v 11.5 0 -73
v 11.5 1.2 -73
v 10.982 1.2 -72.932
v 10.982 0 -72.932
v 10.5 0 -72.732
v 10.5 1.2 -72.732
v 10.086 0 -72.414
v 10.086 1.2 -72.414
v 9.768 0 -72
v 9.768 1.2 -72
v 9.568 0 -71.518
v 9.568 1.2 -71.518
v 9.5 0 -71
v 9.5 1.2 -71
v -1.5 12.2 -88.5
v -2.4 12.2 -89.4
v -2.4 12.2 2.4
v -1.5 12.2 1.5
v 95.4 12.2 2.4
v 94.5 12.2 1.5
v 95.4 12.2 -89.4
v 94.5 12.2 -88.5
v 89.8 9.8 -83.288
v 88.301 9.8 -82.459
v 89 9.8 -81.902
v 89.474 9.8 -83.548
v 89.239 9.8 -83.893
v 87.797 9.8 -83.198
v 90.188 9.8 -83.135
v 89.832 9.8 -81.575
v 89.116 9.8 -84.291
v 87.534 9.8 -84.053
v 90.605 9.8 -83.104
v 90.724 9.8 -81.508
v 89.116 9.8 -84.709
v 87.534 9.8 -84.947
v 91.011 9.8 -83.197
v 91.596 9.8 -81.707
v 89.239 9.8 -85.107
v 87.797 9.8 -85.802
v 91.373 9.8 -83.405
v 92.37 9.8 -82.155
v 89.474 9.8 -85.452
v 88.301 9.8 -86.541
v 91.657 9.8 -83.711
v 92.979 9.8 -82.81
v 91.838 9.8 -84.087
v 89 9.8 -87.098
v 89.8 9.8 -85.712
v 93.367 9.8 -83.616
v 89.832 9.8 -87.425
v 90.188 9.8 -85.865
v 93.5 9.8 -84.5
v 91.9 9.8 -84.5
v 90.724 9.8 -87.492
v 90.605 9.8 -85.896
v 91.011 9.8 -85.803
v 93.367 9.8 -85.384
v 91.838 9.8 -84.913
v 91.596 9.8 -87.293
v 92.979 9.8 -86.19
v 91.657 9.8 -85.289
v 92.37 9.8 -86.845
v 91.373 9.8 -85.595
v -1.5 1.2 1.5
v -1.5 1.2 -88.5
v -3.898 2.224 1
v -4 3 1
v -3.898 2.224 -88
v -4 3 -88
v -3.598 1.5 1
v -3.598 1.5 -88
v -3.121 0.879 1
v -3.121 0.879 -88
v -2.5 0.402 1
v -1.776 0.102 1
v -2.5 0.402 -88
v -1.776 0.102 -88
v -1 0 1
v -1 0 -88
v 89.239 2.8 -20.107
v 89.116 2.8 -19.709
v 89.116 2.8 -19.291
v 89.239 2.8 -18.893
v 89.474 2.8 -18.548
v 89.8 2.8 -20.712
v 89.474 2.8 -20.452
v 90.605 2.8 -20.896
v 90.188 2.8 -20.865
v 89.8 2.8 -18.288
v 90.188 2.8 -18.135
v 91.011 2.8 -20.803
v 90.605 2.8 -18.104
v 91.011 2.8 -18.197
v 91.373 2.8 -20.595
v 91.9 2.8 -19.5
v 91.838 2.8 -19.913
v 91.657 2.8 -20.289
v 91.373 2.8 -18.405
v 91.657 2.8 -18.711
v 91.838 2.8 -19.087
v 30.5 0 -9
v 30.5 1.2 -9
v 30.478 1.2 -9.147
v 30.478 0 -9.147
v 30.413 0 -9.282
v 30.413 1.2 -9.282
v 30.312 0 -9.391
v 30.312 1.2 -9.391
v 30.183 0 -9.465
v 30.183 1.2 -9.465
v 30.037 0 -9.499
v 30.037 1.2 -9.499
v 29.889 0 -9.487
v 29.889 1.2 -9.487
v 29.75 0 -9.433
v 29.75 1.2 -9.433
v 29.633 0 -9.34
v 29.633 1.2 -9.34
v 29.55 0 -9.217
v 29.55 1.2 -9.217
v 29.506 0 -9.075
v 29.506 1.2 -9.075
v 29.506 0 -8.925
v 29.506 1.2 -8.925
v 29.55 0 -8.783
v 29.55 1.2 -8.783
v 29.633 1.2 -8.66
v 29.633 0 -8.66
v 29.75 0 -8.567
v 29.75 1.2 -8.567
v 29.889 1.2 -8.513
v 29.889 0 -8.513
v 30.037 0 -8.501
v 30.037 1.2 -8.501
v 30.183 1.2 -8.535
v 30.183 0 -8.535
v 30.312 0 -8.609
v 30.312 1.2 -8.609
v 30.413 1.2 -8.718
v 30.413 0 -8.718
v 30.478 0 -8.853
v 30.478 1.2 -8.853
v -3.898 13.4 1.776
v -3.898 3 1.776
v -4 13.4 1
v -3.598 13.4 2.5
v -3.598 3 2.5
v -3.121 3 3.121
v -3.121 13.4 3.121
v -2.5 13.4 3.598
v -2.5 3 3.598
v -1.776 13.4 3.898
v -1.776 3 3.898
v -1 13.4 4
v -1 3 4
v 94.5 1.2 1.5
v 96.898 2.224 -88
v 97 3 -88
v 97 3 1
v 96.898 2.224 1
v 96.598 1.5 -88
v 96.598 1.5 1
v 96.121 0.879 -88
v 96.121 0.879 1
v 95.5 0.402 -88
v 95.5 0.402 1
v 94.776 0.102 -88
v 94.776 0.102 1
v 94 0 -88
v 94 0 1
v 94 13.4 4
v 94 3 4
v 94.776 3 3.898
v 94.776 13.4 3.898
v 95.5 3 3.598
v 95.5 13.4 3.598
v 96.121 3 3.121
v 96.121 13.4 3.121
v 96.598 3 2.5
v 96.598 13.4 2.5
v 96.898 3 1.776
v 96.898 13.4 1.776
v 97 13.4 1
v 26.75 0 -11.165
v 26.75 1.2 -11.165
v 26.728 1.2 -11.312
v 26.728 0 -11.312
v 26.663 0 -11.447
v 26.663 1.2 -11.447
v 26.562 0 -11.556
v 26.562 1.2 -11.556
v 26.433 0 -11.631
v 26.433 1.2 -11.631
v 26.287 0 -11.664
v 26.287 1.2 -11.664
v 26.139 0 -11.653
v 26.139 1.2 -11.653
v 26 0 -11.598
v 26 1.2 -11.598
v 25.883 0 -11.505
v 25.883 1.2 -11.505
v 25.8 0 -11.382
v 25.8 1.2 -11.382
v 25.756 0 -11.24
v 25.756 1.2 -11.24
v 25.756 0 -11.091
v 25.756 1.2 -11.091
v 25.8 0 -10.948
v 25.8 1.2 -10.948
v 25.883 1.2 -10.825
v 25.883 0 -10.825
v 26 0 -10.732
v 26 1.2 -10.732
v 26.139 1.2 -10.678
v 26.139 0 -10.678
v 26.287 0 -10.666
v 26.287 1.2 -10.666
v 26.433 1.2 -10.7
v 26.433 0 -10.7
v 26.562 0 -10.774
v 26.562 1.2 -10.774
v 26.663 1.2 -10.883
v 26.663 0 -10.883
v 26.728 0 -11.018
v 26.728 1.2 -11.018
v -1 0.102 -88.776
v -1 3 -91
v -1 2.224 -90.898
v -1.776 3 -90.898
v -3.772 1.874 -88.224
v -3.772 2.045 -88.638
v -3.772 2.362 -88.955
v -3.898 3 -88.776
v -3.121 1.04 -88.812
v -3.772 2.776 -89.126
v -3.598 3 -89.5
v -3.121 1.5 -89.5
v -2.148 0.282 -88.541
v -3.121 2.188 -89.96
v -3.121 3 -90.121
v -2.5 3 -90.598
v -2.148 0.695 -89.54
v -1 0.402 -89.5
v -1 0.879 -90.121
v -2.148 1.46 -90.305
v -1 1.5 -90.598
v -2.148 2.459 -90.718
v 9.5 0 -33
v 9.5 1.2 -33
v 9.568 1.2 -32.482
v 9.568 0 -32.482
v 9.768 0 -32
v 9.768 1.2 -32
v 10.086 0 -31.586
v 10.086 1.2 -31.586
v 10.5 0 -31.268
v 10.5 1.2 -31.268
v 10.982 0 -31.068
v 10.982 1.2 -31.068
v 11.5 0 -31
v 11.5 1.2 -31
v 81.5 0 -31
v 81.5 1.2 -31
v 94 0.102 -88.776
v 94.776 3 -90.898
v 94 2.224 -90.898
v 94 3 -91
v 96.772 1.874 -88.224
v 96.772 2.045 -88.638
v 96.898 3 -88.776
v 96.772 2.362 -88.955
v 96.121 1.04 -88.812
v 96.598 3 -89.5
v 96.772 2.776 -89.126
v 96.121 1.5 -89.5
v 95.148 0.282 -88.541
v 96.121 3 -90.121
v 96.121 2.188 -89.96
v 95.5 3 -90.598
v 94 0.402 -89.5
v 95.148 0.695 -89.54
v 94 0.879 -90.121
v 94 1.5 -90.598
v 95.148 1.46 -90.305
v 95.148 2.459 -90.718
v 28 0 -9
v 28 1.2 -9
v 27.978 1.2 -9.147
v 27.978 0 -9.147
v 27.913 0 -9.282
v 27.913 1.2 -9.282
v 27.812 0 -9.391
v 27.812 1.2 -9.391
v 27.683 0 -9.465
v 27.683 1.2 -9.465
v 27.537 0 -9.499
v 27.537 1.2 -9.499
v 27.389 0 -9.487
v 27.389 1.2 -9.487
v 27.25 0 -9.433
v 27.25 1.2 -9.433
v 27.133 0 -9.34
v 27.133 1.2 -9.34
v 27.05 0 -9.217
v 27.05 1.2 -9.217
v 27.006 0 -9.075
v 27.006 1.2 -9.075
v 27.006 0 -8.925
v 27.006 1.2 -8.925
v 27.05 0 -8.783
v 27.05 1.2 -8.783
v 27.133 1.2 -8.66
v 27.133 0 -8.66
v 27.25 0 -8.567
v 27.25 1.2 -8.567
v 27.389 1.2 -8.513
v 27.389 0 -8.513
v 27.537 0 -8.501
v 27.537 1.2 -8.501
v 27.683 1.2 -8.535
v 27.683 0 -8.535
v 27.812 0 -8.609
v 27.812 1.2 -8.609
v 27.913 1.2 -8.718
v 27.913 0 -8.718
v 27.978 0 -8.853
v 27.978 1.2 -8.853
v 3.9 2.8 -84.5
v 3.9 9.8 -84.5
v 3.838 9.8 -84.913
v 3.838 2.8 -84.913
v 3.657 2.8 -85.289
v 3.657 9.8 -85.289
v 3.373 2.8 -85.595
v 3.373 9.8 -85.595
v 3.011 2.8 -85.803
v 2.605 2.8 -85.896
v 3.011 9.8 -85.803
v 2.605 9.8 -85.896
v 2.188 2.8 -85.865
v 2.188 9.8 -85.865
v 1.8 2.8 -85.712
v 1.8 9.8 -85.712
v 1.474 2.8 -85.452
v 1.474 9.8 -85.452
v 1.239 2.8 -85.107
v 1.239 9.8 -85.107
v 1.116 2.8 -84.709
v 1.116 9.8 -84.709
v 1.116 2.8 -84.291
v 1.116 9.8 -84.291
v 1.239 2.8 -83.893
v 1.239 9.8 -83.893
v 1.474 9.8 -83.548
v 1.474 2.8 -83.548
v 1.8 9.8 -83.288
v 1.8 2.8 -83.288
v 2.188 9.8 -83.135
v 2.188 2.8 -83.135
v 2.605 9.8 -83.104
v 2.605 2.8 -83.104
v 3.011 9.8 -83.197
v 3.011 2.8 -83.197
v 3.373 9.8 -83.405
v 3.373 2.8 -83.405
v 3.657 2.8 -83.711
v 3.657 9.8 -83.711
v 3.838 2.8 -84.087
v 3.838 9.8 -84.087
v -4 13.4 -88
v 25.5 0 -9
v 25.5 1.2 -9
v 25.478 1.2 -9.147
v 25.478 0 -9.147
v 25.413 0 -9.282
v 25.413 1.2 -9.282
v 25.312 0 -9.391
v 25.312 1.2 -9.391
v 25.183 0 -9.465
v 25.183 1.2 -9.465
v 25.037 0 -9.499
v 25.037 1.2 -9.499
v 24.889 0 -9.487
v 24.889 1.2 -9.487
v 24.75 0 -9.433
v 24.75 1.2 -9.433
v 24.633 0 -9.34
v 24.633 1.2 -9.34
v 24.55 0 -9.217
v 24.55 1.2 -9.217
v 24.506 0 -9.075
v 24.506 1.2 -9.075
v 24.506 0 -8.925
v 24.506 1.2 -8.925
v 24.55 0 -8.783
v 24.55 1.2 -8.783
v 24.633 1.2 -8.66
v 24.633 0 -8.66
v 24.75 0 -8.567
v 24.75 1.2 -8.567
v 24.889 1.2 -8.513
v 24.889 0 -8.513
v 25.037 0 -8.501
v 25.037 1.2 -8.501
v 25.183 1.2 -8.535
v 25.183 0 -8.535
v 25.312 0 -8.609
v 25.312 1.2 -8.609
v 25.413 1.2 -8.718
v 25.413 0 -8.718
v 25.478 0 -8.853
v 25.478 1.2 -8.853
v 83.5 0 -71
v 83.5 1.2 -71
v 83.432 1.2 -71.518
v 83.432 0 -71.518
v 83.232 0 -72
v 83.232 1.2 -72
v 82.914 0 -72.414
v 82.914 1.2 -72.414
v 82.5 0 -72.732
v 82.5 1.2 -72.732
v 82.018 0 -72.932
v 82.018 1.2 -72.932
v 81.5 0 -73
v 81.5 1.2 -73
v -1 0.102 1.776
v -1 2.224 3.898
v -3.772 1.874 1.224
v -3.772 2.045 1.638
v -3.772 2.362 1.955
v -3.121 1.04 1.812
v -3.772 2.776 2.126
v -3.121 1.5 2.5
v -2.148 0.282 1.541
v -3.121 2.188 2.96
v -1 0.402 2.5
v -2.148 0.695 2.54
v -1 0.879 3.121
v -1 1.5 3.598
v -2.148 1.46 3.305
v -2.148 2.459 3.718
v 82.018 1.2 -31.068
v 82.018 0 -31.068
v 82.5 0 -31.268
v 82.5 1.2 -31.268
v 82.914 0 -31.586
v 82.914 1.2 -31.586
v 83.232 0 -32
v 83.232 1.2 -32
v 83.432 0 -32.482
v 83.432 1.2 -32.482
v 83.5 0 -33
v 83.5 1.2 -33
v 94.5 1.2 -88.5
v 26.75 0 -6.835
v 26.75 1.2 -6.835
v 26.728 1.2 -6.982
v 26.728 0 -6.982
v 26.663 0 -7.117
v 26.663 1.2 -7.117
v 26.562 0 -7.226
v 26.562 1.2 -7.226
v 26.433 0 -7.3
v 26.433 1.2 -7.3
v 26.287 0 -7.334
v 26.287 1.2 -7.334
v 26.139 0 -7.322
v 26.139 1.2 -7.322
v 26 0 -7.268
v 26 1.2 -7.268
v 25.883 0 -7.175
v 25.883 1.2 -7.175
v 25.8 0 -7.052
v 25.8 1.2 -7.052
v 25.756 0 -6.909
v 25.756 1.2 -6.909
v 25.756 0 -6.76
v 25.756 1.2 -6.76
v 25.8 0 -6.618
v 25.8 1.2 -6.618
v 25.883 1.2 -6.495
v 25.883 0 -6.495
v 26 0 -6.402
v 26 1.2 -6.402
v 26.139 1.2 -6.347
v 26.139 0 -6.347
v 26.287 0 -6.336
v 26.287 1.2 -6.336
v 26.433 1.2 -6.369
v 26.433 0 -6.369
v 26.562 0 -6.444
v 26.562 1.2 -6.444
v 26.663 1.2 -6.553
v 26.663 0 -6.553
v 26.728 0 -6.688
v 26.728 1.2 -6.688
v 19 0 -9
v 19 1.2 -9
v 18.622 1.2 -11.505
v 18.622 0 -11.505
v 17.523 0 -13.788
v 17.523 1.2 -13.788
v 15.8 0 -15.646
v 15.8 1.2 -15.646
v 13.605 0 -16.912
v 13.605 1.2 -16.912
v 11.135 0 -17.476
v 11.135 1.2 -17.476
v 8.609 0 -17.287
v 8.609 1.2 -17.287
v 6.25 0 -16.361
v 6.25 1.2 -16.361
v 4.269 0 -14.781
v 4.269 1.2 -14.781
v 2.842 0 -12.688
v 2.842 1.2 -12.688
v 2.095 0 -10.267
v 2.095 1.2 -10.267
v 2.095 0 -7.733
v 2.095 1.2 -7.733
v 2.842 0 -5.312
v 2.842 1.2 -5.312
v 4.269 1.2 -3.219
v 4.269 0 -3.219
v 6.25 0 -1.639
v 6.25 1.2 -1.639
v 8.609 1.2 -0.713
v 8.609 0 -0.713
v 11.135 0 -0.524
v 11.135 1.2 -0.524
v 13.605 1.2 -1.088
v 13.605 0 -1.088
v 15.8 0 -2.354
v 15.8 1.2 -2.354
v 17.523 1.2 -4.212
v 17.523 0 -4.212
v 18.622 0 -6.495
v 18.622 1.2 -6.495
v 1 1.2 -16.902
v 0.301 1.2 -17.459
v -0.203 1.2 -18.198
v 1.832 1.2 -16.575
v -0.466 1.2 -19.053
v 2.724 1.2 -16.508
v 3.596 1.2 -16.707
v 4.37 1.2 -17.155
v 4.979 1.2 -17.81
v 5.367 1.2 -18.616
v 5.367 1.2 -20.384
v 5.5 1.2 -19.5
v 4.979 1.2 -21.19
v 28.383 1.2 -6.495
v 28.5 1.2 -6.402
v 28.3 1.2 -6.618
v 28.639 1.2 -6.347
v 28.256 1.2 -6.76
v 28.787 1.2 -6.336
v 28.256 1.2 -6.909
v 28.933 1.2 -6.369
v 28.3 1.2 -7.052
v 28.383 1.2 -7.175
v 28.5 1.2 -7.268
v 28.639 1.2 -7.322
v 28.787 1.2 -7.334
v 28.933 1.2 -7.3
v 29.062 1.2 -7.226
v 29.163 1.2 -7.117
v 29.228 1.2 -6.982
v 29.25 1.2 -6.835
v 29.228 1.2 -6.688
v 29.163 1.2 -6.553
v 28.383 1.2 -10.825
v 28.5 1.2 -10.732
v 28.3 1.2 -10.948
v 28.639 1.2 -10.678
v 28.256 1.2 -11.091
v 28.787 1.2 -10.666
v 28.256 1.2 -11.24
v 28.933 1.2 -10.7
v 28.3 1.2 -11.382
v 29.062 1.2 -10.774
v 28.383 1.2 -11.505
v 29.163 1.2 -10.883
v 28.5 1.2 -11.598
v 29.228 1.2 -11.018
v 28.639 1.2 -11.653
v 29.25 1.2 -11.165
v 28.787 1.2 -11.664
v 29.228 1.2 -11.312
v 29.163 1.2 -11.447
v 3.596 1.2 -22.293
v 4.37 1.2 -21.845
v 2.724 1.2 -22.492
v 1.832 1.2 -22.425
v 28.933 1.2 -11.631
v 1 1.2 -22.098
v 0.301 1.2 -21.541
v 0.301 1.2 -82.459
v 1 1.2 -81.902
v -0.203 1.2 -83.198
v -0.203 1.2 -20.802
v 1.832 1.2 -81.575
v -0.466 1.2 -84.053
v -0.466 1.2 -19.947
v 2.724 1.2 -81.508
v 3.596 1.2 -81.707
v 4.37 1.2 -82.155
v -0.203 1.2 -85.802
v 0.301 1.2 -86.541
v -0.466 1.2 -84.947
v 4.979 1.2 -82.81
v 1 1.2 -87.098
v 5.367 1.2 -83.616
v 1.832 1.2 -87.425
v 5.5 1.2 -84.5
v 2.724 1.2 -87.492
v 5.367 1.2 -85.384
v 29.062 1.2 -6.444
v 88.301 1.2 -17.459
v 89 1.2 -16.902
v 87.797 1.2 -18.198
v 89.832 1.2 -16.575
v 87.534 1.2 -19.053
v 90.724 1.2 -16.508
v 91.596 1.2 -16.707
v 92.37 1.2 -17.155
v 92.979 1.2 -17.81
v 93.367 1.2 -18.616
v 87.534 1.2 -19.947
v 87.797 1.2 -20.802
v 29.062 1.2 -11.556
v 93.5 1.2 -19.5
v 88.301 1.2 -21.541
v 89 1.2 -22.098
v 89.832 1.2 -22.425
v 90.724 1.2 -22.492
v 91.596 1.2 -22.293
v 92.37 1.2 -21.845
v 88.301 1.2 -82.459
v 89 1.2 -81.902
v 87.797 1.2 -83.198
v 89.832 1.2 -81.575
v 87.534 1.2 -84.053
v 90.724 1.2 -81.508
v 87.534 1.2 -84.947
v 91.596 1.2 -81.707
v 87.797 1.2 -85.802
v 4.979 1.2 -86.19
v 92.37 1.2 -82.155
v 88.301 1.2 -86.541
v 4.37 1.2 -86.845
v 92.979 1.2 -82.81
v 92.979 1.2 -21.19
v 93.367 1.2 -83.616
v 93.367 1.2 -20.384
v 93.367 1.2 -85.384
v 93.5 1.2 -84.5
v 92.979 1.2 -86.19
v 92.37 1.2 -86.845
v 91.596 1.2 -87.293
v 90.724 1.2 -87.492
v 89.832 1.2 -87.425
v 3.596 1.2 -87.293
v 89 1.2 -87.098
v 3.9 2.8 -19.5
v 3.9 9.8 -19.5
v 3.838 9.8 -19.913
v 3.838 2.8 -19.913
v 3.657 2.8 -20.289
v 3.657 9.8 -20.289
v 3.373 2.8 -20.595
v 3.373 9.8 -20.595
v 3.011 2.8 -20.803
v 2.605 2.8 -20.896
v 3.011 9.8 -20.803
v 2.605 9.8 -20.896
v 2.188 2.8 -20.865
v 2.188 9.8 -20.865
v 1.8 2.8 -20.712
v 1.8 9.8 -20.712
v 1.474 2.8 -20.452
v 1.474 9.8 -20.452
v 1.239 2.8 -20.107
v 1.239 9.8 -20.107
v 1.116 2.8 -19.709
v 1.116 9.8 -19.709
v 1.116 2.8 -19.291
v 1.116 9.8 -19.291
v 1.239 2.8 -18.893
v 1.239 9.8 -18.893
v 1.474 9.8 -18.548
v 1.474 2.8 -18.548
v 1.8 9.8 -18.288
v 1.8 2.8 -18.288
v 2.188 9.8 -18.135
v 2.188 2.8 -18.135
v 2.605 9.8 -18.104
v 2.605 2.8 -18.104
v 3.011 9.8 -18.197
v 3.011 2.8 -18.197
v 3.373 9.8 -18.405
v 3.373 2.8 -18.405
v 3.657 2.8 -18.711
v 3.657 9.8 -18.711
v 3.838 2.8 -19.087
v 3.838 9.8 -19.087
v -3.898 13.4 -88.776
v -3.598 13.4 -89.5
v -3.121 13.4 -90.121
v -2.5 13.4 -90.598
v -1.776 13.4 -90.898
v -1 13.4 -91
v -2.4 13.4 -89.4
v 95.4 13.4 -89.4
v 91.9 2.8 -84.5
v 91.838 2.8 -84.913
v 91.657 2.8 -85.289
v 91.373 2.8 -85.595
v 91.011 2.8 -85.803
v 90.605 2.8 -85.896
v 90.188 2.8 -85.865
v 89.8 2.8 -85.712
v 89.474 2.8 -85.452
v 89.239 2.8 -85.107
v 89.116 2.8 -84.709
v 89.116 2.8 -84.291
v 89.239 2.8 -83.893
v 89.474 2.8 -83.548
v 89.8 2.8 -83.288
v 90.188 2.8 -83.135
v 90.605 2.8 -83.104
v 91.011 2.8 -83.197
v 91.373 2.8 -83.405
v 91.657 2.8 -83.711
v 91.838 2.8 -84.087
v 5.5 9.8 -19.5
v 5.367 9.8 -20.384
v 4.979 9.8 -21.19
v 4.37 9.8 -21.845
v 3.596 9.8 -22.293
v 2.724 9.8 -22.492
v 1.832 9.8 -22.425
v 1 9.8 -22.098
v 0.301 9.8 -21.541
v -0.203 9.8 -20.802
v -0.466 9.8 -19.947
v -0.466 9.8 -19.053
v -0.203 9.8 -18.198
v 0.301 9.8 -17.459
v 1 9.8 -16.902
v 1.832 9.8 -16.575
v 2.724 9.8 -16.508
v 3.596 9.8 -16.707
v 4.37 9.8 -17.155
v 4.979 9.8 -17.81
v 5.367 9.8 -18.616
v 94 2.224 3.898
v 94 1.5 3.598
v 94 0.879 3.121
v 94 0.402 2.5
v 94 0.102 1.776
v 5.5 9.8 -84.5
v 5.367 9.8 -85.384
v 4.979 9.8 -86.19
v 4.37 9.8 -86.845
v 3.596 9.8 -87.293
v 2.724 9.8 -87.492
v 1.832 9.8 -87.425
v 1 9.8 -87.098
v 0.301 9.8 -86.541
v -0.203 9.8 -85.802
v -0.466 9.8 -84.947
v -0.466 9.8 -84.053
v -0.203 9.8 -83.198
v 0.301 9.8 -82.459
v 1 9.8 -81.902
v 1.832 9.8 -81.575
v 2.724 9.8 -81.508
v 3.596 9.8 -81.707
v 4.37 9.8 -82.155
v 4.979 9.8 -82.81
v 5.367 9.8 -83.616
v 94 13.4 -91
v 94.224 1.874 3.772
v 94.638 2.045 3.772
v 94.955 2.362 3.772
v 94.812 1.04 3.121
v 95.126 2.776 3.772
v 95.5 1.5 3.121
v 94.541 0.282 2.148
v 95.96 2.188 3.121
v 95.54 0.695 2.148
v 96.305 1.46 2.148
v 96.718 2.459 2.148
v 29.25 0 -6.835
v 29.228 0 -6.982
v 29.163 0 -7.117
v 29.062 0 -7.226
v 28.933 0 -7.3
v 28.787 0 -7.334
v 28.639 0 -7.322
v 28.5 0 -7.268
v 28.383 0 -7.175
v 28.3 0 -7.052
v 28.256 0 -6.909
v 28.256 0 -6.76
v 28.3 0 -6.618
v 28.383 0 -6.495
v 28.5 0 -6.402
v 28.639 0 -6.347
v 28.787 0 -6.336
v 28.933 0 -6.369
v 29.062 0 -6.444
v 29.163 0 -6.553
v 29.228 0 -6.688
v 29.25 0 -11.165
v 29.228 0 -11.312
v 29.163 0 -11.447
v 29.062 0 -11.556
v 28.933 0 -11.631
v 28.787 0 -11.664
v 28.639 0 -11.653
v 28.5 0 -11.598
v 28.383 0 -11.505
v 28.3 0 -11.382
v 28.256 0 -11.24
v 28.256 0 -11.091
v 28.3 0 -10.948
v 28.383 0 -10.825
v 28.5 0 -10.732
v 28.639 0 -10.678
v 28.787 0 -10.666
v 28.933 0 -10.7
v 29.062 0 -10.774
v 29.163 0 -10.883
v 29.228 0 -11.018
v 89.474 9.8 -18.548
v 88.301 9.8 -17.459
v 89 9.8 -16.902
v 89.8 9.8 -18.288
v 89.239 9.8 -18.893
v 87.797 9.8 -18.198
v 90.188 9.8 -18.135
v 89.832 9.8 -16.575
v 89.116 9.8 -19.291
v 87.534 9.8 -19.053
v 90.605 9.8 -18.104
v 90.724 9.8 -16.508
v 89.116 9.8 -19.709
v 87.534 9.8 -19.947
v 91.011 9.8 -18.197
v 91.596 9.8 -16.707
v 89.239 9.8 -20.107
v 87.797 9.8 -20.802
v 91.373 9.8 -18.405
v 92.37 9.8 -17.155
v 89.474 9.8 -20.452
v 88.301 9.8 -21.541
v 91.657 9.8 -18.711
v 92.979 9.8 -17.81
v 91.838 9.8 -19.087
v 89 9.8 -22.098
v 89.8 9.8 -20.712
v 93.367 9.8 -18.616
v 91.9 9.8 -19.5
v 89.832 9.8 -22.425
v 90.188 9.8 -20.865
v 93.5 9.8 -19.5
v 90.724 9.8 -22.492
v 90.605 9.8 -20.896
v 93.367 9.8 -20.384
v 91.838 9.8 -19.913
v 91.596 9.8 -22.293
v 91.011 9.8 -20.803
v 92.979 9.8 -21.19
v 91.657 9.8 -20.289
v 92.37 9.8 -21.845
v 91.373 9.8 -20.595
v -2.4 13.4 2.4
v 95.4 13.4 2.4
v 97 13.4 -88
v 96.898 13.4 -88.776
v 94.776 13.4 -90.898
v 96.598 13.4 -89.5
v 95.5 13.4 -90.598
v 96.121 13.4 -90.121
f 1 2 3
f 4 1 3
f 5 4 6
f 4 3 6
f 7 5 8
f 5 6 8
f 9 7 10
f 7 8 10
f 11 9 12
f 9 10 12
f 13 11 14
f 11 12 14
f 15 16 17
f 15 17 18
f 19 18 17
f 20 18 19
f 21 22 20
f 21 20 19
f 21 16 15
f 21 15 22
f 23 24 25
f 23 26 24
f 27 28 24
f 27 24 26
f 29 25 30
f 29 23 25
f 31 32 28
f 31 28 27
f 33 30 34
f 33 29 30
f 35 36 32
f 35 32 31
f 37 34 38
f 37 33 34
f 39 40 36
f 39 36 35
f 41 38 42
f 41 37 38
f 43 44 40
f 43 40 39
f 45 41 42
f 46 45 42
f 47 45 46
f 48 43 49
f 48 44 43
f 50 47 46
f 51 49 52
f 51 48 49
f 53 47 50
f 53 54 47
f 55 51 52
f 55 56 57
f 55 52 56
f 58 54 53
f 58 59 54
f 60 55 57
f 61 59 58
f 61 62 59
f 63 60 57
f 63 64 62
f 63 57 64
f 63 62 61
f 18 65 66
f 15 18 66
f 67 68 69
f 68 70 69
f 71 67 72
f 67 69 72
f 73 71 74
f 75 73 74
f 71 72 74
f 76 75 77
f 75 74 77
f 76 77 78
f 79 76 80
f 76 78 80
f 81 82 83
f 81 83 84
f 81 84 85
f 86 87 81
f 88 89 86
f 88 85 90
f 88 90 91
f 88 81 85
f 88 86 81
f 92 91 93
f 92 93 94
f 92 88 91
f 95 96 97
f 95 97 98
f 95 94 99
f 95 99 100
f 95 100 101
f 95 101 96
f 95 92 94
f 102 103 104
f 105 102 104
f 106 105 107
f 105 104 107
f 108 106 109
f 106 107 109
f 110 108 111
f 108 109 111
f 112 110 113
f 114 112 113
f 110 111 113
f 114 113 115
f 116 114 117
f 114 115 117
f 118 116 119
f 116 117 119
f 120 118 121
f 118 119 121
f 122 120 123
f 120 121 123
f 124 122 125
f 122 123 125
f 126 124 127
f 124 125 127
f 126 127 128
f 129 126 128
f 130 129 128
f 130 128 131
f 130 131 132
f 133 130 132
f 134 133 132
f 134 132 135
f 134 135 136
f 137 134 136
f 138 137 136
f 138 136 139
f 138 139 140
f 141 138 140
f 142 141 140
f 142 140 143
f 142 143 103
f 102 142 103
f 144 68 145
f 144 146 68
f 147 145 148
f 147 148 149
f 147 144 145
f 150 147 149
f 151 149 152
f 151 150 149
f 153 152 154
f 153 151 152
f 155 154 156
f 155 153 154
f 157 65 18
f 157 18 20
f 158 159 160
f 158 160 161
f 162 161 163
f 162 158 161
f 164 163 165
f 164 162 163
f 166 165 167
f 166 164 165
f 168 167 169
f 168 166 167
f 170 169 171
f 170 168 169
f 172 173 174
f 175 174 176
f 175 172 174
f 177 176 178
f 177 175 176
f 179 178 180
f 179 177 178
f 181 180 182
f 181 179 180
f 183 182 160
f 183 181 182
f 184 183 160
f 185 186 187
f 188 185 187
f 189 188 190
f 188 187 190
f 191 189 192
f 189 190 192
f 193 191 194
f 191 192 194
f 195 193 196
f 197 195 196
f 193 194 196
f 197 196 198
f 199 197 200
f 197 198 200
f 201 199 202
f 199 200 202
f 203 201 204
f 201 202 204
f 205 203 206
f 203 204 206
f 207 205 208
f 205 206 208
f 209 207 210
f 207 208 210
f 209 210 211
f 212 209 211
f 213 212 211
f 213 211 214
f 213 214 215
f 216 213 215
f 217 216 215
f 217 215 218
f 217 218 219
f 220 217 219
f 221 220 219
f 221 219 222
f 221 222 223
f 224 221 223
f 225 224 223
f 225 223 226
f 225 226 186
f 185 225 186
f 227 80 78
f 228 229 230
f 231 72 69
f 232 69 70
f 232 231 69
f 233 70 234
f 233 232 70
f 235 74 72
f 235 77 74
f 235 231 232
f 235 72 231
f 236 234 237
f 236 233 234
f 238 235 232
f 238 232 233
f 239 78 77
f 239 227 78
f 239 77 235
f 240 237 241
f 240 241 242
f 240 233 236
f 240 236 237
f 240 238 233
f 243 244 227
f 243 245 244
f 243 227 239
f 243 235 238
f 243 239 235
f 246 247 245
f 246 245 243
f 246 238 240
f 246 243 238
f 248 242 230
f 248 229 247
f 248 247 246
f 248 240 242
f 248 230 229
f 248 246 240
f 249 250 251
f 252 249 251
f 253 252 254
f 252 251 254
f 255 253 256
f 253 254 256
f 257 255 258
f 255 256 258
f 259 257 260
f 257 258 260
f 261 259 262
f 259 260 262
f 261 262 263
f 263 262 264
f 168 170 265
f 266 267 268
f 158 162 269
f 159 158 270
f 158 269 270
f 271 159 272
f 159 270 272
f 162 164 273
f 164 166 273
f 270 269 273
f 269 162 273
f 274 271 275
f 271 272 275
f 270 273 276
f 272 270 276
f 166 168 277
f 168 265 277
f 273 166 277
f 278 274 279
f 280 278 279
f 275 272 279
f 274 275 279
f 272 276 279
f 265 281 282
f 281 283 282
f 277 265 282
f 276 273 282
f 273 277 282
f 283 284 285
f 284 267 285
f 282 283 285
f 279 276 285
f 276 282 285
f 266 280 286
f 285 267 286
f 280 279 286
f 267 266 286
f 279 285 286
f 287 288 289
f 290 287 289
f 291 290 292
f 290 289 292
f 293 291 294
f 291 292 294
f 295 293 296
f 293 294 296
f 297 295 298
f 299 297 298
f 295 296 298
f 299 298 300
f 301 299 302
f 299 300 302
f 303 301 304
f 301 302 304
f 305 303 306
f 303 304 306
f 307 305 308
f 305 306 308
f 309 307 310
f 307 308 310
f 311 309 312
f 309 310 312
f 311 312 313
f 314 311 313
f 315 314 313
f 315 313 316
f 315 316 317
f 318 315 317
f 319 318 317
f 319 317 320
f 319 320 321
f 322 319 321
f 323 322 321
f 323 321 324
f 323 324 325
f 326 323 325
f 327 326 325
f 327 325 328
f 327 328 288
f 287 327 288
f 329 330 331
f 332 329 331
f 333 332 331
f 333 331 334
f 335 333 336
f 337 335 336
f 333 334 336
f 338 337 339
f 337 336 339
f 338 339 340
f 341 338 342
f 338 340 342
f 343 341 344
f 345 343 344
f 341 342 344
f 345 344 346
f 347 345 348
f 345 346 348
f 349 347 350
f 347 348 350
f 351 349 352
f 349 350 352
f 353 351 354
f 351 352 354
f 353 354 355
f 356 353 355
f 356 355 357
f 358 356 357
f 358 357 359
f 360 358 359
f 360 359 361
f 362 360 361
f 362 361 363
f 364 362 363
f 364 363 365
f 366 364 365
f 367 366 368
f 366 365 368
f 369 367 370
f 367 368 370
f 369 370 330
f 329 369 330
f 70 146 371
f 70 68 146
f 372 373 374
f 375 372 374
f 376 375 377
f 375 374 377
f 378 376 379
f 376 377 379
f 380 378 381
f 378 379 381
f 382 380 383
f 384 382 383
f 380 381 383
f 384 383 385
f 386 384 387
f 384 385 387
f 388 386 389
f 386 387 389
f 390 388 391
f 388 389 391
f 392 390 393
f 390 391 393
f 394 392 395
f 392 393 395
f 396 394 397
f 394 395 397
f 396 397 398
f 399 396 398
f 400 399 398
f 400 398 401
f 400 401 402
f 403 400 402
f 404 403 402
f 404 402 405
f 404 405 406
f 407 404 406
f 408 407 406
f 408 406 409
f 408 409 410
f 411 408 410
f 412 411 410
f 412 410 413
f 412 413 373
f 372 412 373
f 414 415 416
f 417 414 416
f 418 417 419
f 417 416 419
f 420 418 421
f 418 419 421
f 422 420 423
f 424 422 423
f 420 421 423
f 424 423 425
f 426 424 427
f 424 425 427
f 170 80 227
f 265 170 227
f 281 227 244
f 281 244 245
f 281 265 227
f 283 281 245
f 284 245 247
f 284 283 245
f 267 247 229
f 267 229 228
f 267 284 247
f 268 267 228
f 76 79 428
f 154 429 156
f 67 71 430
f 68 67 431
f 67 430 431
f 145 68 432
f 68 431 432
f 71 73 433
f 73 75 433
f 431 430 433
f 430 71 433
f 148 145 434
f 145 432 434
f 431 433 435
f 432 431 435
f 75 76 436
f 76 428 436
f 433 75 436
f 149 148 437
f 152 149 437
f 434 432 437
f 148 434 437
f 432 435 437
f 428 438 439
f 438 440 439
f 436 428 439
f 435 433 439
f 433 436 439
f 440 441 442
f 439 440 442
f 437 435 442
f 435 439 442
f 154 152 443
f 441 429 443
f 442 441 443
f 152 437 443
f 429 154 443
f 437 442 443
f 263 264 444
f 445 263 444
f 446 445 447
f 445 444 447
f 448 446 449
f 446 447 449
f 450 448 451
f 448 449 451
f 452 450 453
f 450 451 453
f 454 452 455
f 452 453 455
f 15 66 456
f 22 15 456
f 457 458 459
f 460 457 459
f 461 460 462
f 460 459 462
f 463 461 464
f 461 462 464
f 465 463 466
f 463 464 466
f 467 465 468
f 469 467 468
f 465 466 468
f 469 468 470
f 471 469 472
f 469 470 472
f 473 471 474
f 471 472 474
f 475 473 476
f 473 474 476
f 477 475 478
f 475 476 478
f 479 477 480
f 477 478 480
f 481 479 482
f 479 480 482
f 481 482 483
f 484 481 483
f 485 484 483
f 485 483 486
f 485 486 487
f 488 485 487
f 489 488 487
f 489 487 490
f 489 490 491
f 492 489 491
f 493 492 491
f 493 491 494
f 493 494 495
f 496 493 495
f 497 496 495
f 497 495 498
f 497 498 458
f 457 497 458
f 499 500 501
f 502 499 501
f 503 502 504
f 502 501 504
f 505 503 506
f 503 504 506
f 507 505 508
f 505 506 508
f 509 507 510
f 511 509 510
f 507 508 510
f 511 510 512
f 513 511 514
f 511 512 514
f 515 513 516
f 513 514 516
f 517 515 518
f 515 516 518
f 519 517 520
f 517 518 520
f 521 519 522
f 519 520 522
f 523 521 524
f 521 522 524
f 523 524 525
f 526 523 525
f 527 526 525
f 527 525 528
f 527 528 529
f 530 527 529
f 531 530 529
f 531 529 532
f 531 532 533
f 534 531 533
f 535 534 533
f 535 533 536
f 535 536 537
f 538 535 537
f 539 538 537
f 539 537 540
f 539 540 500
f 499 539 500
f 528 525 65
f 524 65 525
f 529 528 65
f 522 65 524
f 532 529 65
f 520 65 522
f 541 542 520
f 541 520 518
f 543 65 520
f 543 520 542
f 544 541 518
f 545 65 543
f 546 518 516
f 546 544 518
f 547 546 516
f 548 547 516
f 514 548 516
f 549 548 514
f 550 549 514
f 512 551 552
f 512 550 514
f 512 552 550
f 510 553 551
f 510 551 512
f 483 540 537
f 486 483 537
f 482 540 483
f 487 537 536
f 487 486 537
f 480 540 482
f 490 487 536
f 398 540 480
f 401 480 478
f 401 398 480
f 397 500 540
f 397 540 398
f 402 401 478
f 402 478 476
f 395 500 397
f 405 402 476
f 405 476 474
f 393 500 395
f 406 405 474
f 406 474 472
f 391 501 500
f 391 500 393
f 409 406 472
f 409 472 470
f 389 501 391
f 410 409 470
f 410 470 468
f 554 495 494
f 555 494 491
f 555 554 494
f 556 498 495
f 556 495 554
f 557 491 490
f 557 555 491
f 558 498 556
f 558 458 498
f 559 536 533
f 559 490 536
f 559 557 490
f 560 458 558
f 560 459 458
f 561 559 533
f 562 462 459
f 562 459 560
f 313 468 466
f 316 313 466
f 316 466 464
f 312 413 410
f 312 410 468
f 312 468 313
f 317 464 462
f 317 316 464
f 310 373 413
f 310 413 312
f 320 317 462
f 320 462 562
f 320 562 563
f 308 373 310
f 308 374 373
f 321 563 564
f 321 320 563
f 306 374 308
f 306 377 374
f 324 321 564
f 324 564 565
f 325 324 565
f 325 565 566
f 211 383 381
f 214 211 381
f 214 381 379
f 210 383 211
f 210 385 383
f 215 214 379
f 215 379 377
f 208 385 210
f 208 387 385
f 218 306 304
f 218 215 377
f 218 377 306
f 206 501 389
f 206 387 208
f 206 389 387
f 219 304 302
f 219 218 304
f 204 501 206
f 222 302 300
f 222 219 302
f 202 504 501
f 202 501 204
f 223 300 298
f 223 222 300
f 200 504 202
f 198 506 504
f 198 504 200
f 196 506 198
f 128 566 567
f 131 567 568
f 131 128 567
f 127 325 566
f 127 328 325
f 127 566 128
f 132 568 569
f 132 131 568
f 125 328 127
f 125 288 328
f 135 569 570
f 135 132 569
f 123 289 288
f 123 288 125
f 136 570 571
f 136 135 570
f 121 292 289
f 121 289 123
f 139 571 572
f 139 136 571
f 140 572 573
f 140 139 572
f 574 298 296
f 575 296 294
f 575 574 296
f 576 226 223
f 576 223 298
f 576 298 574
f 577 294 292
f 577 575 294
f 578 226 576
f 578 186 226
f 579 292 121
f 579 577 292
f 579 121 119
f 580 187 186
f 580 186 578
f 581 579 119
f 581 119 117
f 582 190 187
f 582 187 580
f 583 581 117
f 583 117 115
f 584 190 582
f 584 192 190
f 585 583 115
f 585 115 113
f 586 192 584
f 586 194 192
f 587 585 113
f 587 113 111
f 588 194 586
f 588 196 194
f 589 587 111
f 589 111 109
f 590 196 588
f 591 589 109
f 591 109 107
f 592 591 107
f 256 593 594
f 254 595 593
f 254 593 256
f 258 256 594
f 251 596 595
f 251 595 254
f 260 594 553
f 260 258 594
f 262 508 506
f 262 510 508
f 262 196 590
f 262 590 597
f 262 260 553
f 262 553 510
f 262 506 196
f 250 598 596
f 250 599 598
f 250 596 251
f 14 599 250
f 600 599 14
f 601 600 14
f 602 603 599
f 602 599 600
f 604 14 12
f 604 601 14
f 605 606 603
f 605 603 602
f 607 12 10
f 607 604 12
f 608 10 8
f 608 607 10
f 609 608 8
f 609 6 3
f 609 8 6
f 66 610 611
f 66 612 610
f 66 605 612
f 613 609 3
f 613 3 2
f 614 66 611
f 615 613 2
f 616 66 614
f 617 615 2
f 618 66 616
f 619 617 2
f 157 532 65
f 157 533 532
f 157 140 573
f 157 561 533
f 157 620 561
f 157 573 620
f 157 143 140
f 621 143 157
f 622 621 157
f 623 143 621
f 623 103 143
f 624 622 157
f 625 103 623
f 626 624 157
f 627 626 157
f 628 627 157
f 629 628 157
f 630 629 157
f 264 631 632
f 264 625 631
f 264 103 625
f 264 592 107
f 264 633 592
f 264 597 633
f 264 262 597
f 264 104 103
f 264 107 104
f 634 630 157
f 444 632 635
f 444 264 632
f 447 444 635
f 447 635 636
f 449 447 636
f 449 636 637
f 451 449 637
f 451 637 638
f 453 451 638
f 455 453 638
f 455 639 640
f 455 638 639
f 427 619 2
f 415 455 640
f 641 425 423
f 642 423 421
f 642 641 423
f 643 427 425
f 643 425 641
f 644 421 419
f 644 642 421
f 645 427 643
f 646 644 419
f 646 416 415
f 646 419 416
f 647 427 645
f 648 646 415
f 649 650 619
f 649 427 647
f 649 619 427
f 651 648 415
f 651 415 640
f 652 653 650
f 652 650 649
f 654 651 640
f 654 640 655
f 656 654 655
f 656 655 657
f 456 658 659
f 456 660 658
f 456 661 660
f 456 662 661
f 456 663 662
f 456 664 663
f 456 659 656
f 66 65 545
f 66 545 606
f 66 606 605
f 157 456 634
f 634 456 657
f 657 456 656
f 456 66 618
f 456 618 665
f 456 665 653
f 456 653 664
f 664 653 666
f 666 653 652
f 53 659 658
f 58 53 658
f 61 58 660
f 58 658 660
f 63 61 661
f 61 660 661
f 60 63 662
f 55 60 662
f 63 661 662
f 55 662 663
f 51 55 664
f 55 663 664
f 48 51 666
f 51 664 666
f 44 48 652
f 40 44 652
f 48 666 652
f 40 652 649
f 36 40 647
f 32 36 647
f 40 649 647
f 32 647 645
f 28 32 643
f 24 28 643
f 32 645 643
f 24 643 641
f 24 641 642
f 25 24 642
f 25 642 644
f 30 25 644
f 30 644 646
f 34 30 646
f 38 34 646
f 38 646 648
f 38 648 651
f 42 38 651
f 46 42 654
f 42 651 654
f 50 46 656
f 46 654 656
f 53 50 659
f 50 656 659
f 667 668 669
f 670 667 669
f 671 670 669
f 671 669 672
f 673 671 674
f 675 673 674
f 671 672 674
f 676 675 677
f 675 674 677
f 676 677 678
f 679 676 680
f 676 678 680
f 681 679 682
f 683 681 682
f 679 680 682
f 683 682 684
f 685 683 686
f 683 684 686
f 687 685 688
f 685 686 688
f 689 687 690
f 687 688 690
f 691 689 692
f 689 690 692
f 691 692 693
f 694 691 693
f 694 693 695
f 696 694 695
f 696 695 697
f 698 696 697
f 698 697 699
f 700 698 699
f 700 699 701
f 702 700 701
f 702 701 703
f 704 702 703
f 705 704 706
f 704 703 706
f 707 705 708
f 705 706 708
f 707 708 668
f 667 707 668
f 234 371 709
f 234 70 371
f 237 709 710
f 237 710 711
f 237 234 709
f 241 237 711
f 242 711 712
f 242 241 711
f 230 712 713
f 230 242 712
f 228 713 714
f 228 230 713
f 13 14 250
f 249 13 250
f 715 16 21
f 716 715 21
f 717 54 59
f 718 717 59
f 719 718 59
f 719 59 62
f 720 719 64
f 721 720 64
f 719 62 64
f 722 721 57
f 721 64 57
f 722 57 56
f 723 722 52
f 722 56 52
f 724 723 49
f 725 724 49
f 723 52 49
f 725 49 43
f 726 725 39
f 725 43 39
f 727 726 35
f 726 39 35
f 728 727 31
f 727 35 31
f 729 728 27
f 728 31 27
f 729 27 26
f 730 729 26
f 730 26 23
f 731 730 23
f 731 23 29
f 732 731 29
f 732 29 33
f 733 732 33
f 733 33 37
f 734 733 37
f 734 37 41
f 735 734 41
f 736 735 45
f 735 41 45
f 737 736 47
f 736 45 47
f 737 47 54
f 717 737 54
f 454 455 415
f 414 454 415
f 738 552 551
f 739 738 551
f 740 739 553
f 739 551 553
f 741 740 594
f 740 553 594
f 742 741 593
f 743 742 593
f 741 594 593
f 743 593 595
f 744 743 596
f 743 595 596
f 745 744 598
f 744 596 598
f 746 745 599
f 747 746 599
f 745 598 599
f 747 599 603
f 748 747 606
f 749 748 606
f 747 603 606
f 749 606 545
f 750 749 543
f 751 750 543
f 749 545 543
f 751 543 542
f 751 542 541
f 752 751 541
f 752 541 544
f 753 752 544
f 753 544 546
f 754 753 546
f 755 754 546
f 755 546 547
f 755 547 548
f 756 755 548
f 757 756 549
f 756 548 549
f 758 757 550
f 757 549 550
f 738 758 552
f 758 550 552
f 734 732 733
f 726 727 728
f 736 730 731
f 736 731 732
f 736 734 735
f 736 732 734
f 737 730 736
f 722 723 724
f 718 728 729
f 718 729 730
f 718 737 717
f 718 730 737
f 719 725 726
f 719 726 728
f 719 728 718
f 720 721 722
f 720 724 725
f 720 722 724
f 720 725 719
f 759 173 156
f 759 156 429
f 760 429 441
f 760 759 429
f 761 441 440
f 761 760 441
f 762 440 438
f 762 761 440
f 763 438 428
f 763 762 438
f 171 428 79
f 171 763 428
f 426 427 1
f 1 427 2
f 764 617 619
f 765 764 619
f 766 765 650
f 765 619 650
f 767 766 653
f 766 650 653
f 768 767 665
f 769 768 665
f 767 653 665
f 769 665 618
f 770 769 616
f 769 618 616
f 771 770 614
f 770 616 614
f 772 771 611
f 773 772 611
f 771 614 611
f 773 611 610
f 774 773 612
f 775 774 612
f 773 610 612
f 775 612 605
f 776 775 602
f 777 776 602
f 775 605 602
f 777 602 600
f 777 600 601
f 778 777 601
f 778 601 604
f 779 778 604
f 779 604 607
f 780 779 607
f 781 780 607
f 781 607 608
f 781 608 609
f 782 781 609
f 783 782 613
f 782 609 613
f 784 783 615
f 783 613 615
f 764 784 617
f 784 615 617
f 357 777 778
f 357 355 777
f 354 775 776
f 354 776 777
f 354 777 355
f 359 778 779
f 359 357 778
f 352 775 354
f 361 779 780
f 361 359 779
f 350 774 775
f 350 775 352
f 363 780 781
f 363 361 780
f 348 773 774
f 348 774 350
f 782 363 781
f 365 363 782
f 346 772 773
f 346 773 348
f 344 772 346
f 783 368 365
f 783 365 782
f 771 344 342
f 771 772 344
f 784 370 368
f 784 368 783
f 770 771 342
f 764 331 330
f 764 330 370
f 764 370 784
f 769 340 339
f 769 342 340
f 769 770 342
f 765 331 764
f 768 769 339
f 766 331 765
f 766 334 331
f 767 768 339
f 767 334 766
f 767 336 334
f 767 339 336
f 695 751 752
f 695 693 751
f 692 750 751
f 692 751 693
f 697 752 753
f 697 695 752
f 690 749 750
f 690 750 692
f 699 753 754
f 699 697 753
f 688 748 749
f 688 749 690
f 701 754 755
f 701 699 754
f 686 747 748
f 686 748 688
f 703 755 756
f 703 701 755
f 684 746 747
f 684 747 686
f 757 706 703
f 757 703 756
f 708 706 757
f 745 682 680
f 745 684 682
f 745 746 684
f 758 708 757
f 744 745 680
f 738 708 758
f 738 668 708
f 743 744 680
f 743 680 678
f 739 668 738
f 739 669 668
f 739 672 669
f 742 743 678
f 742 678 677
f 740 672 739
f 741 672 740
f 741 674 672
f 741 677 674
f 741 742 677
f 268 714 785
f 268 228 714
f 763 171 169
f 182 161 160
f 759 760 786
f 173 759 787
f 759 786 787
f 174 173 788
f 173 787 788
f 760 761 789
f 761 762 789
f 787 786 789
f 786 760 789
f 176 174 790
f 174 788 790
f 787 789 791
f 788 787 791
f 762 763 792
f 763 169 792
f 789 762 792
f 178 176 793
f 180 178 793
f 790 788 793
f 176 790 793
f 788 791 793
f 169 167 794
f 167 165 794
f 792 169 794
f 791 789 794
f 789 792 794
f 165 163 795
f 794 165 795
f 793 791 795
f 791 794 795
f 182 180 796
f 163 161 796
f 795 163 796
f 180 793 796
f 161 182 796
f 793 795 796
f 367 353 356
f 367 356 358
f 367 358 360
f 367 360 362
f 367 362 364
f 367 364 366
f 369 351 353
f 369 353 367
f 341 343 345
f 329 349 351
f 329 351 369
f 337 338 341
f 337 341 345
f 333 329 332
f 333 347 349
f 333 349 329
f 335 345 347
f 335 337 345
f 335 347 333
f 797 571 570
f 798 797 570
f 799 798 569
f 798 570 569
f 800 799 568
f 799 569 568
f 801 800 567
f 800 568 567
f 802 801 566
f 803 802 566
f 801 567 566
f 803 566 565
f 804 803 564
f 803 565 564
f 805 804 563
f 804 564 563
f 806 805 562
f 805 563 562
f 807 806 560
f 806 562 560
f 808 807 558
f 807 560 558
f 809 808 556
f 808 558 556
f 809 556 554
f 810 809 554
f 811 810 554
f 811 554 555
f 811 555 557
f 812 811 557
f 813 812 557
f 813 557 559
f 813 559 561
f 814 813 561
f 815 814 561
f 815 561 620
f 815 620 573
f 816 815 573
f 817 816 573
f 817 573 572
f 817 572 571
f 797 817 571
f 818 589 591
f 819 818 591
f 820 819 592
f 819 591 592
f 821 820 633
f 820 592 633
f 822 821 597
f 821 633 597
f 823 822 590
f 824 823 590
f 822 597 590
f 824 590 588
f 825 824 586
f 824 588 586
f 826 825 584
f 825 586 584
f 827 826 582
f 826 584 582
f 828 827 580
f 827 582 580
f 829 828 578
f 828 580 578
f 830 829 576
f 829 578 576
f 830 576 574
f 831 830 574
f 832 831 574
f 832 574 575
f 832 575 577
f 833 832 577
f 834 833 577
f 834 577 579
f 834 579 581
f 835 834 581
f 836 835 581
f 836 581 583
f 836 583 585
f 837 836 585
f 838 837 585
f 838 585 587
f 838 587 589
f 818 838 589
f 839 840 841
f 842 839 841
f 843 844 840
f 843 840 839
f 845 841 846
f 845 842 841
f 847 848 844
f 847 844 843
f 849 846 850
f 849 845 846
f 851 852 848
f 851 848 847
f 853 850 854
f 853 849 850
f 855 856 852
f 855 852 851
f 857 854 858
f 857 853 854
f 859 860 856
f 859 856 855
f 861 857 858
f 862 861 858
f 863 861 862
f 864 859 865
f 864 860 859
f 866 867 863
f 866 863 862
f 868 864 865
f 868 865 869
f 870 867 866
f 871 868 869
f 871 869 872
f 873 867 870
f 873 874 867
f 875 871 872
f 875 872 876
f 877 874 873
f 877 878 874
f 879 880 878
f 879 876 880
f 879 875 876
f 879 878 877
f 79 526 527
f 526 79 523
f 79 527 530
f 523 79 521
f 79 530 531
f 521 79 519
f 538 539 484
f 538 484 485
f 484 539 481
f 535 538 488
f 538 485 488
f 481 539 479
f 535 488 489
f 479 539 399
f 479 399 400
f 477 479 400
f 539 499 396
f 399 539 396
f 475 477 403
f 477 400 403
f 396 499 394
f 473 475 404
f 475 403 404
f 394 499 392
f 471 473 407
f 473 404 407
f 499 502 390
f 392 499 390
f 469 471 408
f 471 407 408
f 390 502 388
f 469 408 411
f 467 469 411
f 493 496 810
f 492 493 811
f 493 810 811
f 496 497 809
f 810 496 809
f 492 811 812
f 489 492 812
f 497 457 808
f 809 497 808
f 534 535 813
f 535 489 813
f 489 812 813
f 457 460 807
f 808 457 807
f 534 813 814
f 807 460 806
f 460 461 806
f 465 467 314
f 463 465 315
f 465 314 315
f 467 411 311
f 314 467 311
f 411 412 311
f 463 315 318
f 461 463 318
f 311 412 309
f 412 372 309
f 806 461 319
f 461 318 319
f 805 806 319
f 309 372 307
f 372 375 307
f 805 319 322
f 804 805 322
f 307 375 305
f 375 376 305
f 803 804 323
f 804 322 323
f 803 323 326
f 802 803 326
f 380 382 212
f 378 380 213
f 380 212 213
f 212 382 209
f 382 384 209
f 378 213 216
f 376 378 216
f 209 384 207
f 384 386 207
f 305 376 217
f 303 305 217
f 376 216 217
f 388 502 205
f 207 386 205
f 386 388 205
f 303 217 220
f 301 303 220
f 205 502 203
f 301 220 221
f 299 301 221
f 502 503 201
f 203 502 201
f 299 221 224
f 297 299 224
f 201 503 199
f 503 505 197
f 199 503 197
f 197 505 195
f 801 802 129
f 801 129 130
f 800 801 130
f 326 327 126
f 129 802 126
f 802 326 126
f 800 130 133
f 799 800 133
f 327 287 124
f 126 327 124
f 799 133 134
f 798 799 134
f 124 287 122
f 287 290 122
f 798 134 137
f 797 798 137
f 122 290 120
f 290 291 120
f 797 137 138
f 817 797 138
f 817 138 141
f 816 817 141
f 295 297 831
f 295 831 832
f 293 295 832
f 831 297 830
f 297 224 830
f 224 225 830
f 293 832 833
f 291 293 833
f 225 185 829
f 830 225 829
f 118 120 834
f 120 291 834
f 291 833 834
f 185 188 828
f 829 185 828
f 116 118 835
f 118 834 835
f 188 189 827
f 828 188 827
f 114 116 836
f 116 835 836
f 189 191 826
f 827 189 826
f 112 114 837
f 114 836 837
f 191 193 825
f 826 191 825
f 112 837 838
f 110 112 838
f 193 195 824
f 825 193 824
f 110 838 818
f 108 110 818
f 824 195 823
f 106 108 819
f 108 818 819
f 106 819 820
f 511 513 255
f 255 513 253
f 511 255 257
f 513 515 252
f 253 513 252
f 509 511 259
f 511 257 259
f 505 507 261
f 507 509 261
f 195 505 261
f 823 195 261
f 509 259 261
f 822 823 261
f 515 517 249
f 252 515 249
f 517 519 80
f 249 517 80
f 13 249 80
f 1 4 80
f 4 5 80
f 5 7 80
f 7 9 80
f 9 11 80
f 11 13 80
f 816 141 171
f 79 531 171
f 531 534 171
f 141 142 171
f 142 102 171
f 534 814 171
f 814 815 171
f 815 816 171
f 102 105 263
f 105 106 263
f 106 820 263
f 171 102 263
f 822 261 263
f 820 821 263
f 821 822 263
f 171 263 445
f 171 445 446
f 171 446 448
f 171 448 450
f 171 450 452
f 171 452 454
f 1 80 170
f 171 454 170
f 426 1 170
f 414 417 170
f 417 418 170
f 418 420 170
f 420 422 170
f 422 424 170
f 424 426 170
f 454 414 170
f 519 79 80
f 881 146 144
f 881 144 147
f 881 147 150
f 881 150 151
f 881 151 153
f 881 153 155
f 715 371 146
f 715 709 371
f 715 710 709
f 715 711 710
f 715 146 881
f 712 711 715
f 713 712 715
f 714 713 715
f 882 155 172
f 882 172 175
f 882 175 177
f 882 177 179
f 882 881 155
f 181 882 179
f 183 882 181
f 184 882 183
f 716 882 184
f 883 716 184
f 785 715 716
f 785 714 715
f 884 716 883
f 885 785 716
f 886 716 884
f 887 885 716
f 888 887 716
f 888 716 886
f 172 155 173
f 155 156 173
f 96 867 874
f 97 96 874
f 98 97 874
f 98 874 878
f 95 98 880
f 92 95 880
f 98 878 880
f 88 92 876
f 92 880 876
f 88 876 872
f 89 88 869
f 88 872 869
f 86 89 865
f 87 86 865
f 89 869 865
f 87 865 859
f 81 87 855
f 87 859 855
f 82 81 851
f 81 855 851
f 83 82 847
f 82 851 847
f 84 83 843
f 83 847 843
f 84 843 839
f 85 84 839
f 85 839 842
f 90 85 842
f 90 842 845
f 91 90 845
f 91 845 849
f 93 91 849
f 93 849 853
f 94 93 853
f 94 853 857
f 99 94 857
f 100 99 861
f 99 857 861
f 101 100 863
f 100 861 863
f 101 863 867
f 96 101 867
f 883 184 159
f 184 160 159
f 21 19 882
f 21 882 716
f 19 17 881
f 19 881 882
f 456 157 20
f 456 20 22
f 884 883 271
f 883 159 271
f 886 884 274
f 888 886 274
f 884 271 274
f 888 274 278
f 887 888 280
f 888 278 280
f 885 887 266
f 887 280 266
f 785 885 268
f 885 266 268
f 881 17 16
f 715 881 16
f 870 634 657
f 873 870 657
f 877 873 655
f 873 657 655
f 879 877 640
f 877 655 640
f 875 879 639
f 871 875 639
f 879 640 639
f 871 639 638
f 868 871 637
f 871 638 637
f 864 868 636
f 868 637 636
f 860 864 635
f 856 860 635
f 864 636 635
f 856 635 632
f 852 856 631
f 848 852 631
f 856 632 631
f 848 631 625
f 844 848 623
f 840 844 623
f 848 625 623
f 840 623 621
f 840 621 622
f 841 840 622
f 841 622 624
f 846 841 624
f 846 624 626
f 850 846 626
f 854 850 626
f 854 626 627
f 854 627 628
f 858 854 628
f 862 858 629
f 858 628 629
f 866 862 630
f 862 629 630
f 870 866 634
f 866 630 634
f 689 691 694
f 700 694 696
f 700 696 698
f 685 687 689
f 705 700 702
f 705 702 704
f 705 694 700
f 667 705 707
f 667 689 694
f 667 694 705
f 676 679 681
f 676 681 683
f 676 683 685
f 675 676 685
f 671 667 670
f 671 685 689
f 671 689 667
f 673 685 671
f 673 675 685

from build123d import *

# Parameters (mm, degrees)
SKETCH3_W           = 101
SKETCH3_H           = 95
BOSS_EXTRUDE2_DEPTH = 1.2
SKETCH5_W           = 101
SKETCH5_H           = 95
SKETCH5_W_2         = 96
SKETCH5_H_2         = 90
BOSS_EXTRUDE3_DEPTH = 11
SKETCH6_W           = 101
SKETCH6_H           = 95
SKETCH6_W_2         = 97.8
SKETCH6_H_2         = 91.8
BOSS_EXTRUDE4_DEPTH = 1.2
FILLET1_R           = 3
SKETCH7_R           = 3
BOSS_EXTRUDE5_DEPTH = 8.6
SKETCH8_R           = 1.4
CUT_EXTRUDE1_DEPTH  = 7
CUT_EXTRUDE2_REACH  = 3.2
SKETCH9_R           = 8.5
SKETCH9_R_2         = 0.5


with BuildPart() as part:
    # Sketch3 → Boss-Extrude2 (new body)
    with BuildSketch(Plane(origin=(0, 0, 0), x_dir=(1, 0, 0), z_dir=(0, 1, 0))):
        with Locations((46.5, 43.5)):
            Rectangle(SKETCH3_W, SKETCH3_H)
    extrude(amount=BOSS_EXTRUDE2_DEPTH)

    # Sketch5 → Boss-Extrude3 (add)
    with BuildSketch(Plane(origin=(0, 1.2, 0), x_dir=(1, 0, 0), z_dir=(0, 1, 0))):
        with Locations((46.5, 43.5)):
            Rectangle(SKETCH5_W, SKETCH5_H)
        with Locations((46.5, 43.5)):
            Rectangle(SKETCH5_W_2, SKETCH5_H_2, mode=Mode.SUBTRACT)
    extrude(amount=BOSS_EXTRUDE3_DEPTH)

    # Sketch6 → Boss-Extrude4 (add)
    with BuildSketch(Plane(origin=(0, 12.2, 0), x_dir=(1, 0, 0), z_dir=(0, 1, 0))):
        with Locations((46.5, 43.5)):
            Rectangle(SKETCH6_W, SKETCH6_H)
        with Locations((46.5, 43.5)):
            Rectangle(SKETCH6_W_2, SKETCH6_H_2, mode=Mode.SUBTRACT)
    extrude(amount=BOSS_EXTRUDE4_DEPTH)

    # Fillet1
    fillet1_edges = [part.edges().sort_by_distance(p)[0] for p in [
        (46.5, 0, -91),
        (97, 0, -43.5),
        (46.5, 0, 4),
        (-4, 0, -43.5),
        (-4, 6.7, -91),
        (97, 6.7, -91),
        (97, 6.7, 4),
        (-4, 6.7, 4),
    ]]
    fillet(fillet1_edges, radius=FILLET1_R)

    # Sketch7 → Boss-Extrude5 (add)
    with BuildSketch(Plane(origin=(0, 1.2, 0), x_dir=(1, 0, 0), z_dir=(0, 1, 0))):
        with Locations((2.5, 84.5)):
            Circle(SKETCH7_R)
        with Locations((90.5, 84.5)):
            Circle(SKETCH7_R)
        with Locations((90.5, 19.5)):
            Circle(SKETCH7_R)
        with Locations((2.5, 19.5)):
            Circle(SKETCH7_R)
    extrude(amount=BOSS_EXTRUDE5_DEPTH)

    # Sketch8 → Cut-Extrude1 (cut)
    with BuildSketch(Plane(origin=(0, 9.8, 0), x_dir=(1, 0, 0), z_dir=(0, 1, 0))):
        with Locations((2.5, 84.5)):
            Circle(SKETCH8_R)
        with Locations((90.5, 84.5)):
            Circle(SKETCH8_R)
        with Locations((90.5, 19.5)):
            Circle(SKETCH8_R)
        with Locations((2.5, 19.5)):
            Circle(SKETCH8_R)
    extrude(amount=-CUT_EXTRUDE1_DEPTH, mode=Mode.SUBTRACT)

    # Sketch9 → Cut-Extrude2 (cut, up to next)
    with BuildSketch(Plane(origin=(0, 1.2, 0), x_dir=(1, 0, 0), z_dir=(0, 1, 0)), mode=Mode.PRIVATE) as cut_extrude2_sk1:
        with Locations((10.5, 9)):
            Circle(SKETCH9_R)
    cut_extrude2_tool1 = extrude(cut_extrude2_sk1.sketch, amount=-CUT_EXTRUDE2_REACH, mode=Mode.PRIVATE) & part.part
    add(cut_extrude2_tool1.solids().sort_by_distance((10.5, 1.2, -9))[0], mode=Mode.SUBTRACT)
    # Sketch9 → Cut-Extrude2 (cut, up to next)
    with BuildSketch(Plane(origin=(0, 1.2, 0), x_dir=(1, 0, 0), z_dir=(0, 1, 0)), mode=Mode.PRIVATE) as cut_extrude2_sk2:
        with Locations((27.5, 9)):
            Circle(SKETCH9_R_2)
    cut_extrude2_tool2 = extrude(cut_extrude2_sk2.sketch, amount=-CUT_EXTRUDE2_REACH, mode=Mode.PRIVATE) & part.part
    add(cut_extrude2_tool2.solids().sort_by_distance((27.5, 1.2, -9))[0], mode=Mode.SUBTRACT)
    # Sketch9 → Cut-Extrude2 (cut, up to next)
    with BuildSketch(Plane(origin=(0, 1.2, 0), x_dir=(1, 0, 0), z_dir=(0, 1, 0)), mode=Mode.PRIVATE) as cut_extrude2_sk3:
        with Locations((28.75, 11.165063509)):
            Circle(SKETCH9_R_2)
    cut_extrude2_tool3 = extrude(cut_extrude2_sk3.sketch, amount=-CUT_EXTRUDE2_REACH, mode=Mode.PRIVATE) & part.part
    add(cut_extrude2_tool3.solids().sort_by_distance((28.75, 1.2, -11.165064))[0], mode=Mode.SUBTRACT)
    # Sketch9 → Cut-Extrude2 (cut, up to next)
    with BuildSketch(Plane(origin=(0, 1.2, 0), x_dir=(1, 0, 0), z_dir=(0, 1, 0)), mode=Mode.PRIVATE) as cut_extrude2_sk4:
        with Locations((26.25, 11.165063509)):
            Circle(SKETCH9_R_2)
    cut_extrude2_tool4 = extrude(cut_extrude2_sk4.sketch, amount=-CUT_EXTRUDE2_REACH, mode=Mode.PRIVATE) & part.part
    add(cut_extrude2_tool4.solids().sort_by_distance((26.25, 1.2, -11.165064))[0], mode=Mode.SUBTRACT)
    # Sketch9 → Cut-Extrude2 (cut, up to next)
    with BuildSketch(Plane(origin=(0, 1.2, 0), x_dir=(1, 0, 0), z_dir=(0, 1, 0)), mode=Mode.PRIVATE) as cut_extrude2_sk5:
        with Locations((25, 9)):
            Circle(SKETCH9_R_2)
    cut_extrude2_tool5 = extrude(cut_extrude2_sk5.sketch, amount=-CUT_EXTRUDE2_REACH, mode=Mode.PRIVATE) & part.part
    add(cut_extrude2_tool5.solids().sort_by_distance((25, 1.2, -9))[0], mode=Mode.SUBTRACT)
    # Sketch9 → Cut-Extrude2 (cut, up to next)
    with BuildSketch(Plane(origin=(0, 1.2, 0), x_dir=(1, 0, 0), z_dir=(0, 1, 0)), mode=Mode.PRIVATE) as cut_extrude2_sk6:
        with Locations((26.25, 6.834936491)):
            Circle(SKETCH9_R_2)
    cut_extrude2_tool6 = extrude(cut_extrude2_sk6.sketch, amount=-CUT_EXTRUDE2_REACH, mode=Mode.PRIVATE) & part.part
    add(cut_extrude2_tool6.solids().sort_by_distance((26.25, 1.2, -6.834936))[0], mode=Mode.SUBTRACT)
    # Sketch9 → Cut-Extrude2 (cut, up to next)
    with BuildSketch(Plane(origin=(0, 1.2, 0), x_dir=(1, 0, 0), z_dir=(0, 1, 0)), mode=Mode.PRIVATE) as cut_extrude2_sk7:
        with Locations((28.75, 6.834936491)):
            Circle(SKETCH9_R_2)
    cut_extrude2_tool7 = extrude(cut_extrude2_sk7.sketch, amount=-CUT_EXTRUDE2_REACH, mode=Mode.PRIVATE) & part.part
    add(cut_extrude2_tool7.solids().sort_by_distance((28.75, 1.2, -6.834936))[0], mode=Mode.SUBTRACT)
    # Sketch9 → Cut-Extrude2 (cut, up to next)
    with BuildSketch(Plane(origin=(0, 1.2, 0), x_dir=(1, 0, 0), z_dir=(0, 1, 0)), mode=Mode.PRIVATE) as cut_extrude2_sk8:
        with Locations((30, 9)):
            Circle(SKETCH9_R_2)
    cut_extrude2_tool8 = extrude(cut_extrude2_sk8.sketch, amount=-CUT_EXTRUDE2_REACH, mode=Mode.PRIVATE) & part.part
    add(cut_extrude2_tool8.solids().sort_by_distance((30, 1.2, -9))[0], mode=Mode.SUBTRACT)
    # Sketch9 → Cut-Extrude2 (cut, up to next)
    with BuildSketch(Plane(origin=(0, 1.2, 0), x_dir=(1, 0, 0), z_dir=(0, 1, 0)), mode=Mode.PRIVATE) as cut_extrude2_sk9:
        with BuildLine():
            Line((11.5, 31), (81.5, 31))
            ThreePointArc((81.5, 31), (82.914213562, 31.585786438), (83.5, 33))
            Line((83.5, 33), (83.5, 71))
            ThreePointArc((83.5, 71), (82.914213562, 72.414213562), (81.5, 73))
            Line((81.5, 73), (11.5, 73))
            ThreePointArc((11.5, 73), (10.085786438, 72.414213562), (9.5, 71))
            Line((9.5, 71), (9.5, 33))
            ThreePointArc((9.5, 33), (10.085786438, 31.585786438), (11.5, 31))
        make_face()
    cut_extrude2_tool9 = extrude(cut_extrude2_sk9.sketch, amount=-CUT_EXTRUDE2_REACH, mode=Mode.PRIVATE) & part.part
    add(cut_extrude2_tool9.solids().sort_by_distance((46.5, 1.2, -52))[0], mode=Mode.SUBTRACT)


solid = part.part
